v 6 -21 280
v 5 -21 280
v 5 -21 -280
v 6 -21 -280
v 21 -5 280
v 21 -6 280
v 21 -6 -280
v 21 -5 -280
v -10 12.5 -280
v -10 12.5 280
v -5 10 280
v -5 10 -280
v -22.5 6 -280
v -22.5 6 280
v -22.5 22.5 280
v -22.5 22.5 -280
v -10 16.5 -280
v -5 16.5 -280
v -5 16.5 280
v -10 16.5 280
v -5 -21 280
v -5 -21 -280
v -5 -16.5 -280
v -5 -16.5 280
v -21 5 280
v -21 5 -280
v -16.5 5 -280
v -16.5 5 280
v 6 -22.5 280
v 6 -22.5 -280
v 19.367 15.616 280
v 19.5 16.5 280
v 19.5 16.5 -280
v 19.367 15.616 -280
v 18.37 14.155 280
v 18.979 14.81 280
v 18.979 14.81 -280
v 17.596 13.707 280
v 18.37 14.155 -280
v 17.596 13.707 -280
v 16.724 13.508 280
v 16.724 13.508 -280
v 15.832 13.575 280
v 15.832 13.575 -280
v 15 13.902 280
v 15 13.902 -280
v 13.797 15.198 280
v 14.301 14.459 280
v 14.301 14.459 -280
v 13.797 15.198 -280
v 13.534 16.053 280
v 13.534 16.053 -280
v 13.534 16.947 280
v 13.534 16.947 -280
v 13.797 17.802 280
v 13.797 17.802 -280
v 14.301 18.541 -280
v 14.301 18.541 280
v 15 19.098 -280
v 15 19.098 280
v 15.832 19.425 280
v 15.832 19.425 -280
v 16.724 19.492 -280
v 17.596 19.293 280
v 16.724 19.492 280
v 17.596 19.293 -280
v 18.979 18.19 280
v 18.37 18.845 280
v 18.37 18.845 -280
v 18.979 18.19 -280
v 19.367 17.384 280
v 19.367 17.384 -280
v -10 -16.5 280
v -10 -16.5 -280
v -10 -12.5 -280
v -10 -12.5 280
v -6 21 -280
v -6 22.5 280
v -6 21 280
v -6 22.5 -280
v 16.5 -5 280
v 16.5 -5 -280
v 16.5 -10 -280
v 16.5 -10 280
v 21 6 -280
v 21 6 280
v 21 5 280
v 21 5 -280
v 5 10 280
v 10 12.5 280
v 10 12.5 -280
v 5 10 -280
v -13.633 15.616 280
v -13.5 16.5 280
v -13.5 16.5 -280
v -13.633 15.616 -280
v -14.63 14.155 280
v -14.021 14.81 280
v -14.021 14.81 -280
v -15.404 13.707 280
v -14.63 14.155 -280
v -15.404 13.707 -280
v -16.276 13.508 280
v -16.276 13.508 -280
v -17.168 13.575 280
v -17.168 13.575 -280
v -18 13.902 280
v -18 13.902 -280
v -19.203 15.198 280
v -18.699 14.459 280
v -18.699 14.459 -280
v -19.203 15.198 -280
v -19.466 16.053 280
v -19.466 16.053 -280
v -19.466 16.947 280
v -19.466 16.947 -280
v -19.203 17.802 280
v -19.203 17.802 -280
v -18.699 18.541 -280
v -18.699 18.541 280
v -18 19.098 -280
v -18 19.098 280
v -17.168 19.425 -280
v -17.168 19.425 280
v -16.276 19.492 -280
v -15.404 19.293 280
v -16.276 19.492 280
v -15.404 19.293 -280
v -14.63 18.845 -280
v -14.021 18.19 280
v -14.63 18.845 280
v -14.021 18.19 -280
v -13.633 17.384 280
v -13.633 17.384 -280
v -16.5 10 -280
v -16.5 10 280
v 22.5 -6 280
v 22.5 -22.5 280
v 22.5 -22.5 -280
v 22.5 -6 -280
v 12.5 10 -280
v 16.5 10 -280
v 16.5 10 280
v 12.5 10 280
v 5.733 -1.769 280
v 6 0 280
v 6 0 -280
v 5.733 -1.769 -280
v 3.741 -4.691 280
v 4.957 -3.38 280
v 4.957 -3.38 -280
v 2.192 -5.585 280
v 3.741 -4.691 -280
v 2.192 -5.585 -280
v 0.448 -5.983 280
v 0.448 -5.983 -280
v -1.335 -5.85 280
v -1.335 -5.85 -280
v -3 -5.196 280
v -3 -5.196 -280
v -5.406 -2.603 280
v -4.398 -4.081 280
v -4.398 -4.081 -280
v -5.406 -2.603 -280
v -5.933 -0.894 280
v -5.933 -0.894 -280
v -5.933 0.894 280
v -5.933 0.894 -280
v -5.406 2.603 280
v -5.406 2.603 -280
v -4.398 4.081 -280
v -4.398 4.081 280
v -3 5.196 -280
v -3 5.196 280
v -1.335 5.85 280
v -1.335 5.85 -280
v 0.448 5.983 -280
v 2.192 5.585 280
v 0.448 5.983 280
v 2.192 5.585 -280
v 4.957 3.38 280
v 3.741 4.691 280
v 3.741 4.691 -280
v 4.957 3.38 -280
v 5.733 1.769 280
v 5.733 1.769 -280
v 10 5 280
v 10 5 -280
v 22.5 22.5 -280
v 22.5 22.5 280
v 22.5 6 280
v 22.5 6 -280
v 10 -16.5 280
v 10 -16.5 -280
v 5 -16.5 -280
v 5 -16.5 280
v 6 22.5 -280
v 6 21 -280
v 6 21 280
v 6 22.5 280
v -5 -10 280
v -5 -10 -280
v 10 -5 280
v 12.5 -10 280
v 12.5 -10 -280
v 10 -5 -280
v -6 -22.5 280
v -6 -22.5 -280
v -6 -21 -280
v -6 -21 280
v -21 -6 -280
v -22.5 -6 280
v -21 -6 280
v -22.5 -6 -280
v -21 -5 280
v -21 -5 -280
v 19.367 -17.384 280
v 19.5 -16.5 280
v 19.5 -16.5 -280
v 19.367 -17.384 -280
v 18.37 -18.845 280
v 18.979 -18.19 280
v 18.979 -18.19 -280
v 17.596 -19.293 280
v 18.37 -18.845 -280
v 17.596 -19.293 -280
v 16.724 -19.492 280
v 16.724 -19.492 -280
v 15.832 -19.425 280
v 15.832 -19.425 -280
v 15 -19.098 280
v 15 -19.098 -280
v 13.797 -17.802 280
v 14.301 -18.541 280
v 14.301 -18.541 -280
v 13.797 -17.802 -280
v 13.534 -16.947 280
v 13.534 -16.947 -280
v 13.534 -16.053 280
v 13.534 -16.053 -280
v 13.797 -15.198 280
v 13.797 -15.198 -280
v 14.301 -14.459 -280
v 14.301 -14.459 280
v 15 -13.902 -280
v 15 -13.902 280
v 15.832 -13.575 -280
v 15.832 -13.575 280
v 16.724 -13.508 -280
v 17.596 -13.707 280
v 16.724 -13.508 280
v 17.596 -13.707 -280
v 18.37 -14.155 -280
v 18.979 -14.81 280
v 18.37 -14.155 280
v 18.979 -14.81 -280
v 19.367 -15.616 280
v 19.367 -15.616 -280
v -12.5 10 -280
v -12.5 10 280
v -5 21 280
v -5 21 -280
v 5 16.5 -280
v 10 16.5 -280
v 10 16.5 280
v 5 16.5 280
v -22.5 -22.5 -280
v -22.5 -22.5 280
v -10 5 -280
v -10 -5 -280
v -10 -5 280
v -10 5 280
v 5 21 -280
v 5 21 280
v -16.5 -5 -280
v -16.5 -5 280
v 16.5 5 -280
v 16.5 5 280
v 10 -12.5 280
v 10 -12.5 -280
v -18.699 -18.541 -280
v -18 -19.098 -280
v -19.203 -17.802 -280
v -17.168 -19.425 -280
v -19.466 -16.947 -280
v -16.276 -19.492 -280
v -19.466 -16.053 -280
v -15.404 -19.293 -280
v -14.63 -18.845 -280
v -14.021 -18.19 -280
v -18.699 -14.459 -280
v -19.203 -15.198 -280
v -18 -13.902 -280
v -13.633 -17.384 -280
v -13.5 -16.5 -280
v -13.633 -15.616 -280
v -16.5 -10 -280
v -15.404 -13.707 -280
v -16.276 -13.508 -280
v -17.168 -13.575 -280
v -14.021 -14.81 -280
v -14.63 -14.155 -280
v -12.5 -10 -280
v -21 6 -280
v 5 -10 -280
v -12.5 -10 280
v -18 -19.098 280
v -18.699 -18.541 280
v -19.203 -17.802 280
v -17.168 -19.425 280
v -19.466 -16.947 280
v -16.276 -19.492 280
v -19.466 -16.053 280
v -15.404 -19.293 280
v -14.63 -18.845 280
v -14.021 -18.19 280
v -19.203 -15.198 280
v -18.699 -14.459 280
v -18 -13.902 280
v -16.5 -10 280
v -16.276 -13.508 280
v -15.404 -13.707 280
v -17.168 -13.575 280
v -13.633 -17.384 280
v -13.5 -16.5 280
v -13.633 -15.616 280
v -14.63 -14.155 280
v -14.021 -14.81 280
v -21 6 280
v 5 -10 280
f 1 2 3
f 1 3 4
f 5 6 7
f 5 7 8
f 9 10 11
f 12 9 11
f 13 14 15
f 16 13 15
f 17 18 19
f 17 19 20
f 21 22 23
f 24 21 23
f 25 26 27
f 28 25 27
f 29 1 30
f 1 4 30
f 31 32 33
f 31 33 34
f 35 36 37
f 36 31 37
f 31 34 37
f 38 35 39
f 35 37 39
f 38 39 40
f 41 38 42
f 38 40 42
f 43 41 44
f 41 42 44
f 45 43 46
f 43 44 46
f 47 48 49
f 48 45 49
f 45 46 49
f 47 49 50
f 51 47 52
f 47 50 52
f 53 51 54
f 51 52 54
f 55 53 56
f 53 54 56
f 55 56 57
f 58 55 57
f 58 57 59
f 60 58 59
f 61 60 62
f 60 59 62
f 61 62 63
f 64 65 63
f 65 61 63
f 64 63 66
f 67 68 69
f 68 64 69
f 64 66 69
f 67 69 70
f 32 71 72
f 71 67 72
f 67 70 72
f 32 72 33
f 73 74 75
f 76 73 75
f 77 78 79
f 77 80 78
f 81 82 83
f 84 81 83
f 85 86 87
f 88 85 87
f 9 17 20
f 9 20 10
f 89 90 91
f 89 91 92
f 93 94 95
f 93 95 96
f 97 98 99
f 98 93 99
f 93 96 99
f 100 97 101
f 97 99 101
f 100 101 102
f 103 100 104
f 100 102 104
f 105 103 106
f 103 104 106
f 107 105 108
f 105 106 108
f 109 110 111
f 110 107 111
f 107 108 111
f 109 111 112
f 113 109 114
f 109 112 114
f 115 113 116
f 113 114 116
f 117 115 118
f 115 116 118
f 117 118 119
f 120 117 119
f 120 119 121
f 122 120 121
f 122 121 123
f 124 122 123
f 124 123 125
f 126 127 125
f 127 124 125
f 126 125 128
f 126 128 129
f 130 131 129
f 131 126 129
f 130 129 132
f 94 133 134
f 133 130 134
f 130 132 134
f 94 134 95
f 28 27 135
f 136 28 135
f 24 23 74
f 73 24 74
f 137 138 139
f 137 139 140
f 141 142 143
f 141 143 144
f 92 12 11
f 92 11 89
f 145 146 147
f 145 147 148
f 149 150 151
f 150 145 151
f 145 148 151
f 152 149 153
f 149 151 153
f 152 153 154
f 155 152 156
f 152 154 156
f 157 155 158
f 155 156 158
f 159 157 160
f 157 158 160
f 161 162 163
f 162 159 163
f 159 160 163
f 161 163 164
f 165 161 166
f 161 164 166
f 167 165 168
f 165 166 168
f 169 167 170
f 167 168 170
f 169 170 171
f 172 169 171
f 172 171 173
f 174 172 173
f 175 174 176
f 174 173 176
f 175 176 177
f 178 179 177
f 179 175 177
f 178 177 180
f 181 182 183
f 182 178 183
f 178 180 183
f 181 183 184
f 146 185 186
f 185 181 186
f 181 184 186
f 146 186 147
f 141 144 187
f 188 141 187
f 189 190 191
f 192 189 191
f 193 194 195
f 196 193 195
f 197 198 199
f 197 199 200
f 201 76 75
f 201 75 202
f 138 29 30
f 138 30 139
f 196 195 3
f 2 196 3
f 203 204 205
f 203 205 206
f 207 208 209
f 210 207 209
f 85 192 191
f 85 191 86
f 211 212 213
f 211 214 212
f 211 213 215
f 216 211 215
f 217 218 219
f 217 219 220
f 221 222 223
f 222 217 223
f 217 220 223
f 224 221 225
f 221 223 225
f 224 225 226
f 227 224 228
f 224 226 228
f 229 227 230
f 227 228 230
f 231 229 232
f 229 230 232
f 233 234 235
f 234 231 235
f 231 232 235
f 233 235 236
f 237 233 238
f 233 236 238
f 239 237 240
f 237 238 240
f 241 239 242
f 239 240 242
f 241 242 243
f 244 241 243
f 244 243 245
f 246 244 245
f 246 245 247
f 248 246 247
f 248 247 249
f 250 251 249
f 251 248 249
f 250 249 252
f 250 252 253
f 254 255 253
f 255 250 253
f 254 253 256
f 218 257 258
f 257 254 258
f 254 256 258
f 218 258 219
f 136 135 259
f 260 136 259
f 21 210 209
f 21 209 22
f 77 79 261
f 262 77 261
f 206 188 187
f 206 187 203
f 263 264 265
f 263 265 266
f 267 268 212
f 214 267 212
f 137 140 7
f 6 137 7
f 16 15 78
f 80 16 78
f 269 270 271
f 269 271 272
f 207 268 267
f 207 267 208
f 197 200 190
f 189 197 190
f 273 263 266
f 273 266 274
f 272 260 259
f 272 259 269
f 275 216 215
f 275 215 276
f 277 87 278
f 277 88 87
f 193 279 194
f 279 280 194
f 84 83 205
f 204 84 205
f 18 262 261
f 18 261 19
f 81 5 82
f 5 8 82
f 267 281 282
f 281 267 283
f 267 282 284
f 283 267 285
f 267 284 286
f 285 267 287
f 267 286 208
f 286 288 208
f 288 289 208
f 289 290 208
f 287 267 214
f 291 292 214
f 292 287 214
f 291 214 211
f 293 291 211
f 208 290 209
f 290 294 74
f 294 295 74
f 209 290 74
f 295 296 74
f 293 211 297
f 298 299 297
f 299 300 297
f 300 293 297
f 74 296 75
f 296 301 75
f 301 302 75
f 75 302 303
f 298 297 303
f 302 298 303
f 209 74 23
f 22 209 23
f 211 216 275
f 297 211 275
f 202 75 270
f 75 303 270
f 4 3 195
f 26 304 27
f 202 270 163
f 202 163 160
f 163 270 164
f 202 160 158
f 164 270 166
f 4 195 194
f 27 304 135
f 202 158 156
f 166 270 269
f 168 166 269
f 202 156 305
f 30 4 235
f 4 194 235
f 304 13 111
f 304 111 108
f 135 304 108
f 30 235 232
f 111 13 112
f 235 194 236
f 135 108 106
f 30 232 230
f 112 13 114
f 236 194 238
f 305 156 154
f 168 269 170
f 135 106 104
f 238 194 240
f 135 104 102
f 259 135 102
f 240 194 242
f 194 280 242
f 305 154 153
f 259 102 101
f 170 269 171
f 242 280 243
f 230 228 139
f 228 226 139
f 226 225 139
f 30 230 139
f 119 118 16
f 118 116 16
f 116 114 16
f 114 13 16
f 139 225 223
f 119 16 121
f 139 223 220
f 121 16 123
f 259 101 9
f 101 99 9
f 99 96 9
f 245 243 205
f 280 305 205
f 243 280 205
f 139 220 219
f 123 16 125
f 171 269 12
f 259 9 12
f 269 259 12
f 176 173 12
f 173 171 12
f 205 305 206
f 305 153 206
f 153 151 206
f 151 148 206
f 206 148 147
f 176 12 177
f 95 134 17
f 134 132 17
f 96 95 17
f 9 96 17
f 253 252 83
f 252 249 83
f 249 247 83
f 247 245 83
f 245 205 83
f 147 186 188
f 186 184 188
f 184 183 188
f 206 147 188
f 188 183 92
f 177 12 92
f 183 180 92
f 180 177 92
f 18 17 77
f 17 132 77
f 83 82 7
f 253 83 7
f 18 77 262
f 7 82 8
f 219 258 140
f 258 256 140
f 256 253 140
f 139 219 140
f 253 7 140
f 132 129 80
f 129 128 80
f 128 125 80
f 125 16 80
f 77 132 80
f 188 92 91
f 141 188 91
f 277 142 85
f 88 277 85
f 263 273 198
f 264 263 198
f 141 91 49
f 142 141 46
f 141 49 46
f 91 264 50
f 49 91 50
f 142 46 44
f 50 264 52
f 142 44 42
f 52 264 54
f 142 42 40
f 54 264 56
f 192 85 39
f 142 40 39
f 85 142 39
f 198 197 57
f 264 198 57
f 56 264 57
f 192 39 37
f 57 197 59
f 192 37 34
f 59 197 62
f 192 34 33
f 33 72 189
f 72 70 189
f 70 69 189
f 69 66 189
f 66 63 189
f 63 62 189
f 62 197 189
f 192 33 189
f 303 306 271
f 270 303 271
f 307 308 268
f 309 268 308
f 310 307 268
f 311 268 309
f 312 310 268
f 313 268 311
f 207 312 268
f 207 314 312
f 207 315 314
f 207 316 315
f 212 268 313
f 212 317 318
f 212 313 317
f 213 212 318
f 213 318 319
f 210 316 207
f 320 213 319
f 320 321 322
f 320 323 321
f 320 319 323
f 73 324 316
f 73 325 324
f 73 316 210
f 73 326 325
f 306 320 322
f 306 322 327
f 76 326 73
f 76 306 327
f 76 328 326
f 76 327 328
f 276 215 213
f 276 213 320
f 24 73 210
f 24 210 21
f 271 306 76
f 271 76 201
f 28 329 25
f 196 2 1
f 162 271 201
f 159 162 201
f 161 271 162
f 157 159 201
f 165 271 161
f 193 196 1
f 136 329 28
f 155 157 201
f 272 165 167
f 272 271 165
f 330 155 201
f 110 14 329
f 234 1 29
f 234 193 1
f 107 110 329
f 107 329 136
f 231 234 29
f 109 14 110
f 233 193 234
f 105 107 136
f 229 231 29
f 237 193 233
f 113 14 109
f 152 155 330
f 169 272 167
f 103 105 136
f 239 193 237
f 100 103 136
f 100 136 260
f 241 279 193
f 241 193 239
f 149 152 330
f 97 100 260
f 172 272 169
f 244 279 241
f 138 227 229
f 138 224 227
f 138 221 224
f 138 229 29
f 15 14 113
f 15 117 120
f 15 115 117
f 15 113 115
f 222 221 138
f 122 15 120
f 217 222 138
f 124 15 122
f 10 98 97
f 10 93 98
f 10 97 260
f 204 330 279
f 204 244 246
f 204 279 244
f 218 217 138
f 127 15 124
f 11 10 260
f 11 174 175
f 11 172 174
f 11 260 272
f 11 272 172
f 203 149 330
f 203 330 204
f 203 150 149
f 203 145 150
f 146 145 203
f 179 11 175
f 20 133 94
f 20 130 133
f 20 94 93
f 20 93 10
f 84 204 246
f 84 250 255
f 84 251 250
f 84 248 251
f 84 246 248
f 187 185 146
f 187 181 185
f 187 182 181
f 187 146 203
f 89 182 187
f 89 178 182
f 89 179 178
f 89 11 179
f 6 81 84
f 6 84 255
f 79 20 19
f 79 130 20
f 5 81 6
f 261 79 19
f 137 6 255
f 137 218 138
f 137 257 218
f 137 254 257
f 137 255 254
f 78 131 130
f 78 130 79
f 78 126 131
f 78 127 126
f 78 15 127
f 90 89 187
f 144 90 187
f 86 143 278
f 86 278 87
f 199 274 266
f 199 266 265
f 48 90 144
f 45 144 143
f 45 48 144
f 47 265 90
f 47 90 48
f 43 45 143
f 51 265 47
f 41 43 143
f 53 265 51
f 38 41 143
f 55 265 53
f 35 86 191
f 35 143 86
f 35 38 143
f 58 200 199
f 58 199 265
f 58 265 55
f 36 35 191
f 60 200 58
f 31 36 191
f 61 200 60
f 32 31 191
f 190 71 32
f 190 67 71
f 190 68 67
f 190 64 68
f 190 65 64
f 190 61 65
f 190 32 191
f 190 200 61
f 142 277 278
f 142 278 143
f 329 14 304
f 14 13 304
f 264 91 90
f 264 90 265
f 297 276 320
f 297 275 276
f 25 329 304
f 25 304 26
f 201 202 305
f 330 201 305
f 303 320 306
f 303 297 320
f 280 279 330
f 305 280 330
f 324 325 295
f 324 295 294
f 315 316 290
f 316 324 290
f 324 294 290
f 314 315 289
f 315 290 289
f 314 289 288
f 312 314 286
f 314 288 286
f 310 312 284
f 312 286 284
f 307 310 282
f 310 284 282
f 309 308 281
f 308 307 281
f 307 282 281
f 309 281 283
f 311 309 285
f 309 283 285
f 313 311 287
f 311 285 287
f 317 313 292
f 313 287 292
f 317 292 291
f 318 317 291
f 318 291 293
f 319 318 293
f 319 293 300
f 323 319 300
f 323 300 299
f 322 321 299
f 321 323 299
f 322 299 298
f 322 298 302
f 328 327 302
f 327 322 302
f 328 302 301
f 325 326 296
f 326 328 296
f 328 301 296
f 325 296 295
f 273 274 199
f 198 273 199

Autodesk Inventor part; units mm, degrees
ref_plane "YZ Plane" through (0, 0, 0) normal (1, 0, 0) x (0, 1, 0)
ref_plane "XZ Plane" through (0, 0, 0) normal (0, 1, 0) x (-1, 0, 0)
ref_plane "XY Plane" through (0, 0, 0) normal (0, 0, 1) x (1, 0, 0)
sketch "Sketch1" plane through (0, 0, 0) normal (0, 0, 1) x (1, 0, 0)
  line L0 (-22.5, 22.5) -> (-6, 22.5)
  line L1 (-6, 22.5) -> (-6, 21)
  line L2 (-6, 21) -> (-5, 21)
  line L3 (-5, 21) -> (-5, 16.5)
  line L4 (-5, 16.5) -> (-10, 16.5)
  line L5 (-10, 16.5) -> (-10, 12.5)
  line L6 (-10, 12.5) -> (-5, 10)
  line L7 (-5, 10) -> (5, 10)
  line L8 (10, 12.5) -> (10, 16.5)
  line L9 (10, 16.5) -> (5, 16.5)
  line L10 (5, 16.5) -> (5, 21)
  line L11 (5, 21) -> (6, 21)
  line L12 (6, 21) -> (6, 22.5)
  line L13 (6, 22.5) -> (22.5, 22.5)
  line L14 (22.5, 22.5) -> (22.5, 6)
  line L15 (22.5, 6) -> (21, 6)
  line L16 (21, 6) -> (21, 5)
  line L17 (21, 5) -> (16.5, 5)
  line L18 (10, 12.5) -> (5, 10)
  line L19 (-22.5, 0) -> (-22.5, 104.1484) construction
  line L20 (-22.5, 0) -> (77.4828, 0) construction
  line L21 (16.5, 5) -> (16.5, 10)
  line L22 (16.5, 10) -> (12.5, 10)
  line L23 (12.5, 10) -> (10, 5)
  line L24 (10, 5) -> (10, 0)
  circle A0 centre (0, 0) radius 6
  circle A1 centre (16.5, 16.5) radius 3
  line L25 (-22.5, 0) -> (45.512, 0) construction
  line L26 (21, -6) -> (21, -5)
  line L27 (22.5, -6) -> (21, -6)
  line L28 (10, -12.5) -> (10, -16.5)
  line L29 (12.5, -10) -> (10, -5)
  line L30 (16.5, -5) -> (16.5, -10)
  line L31 (16.5, -10) -> (12.5, -10)
  line L32 (10, -12.5) -> (5, -10)
  line L33 (22.5, -22.5) -> (22.5, -6)
  circle A2 centre (16.5, -16.5) radius 3
  line L34 (6, -22.5) -> (22.5, -22.5)
  line L35 (5, -16.5) -> (5, -21)
  line L36 (5, -21) -> (6, -21)
  line L37 (6, -21) -> (6, -22.5)
  line L38 (10, -16.5) -> (5, -16.5)
  line L39 (21, -5) -> (16.5, -5)
  line L40 (10, -5) -> (10, 0)
  line L41 (-5, -10) -> (5, -10)
  line L42 (-22.5, -22.5) -> (-6, -22.5)
  line L43 (-6, -22.5) -> (-6, -21)
  line L44 (-6, -21) -> (-5, -21)
  line L45 (-5, -21) -> (-5, -16.5)
  line L46 (-5, -16.5) -> (-10, -16.5)
  line L47 (-10, -16.5) -> (-10, -12.5)
  line L48 (-10, -12.5) -> (-5, -10)
  line L49 (-22.5, -22.5) -> (-22.5, 22.5)
  line L50 (0, -24.7031) -> (0, 16.5) construction
  line L51 (-12.5, 10) -> (-10, 5)
  line L52 (-16.5, 10) -> (-12.5, 10)
  line L53 (-16.5, 5) -> (-16.5, 10)
  line L54 (-21, 5) -> (-16.5, 5)
  line L55 (-21, 6) -> (-21, 5)
  line L56 (-22.5, 6) -> (-21, 6)
  line L57 (-10, 5) -> (-10, 0)
  line L58 (-10, -5) -> (-10, 0)
  line L59 (-12.5, -10) -> (-10, -5)
  line L60 (-16.5, -10) -> (-12.5, -10)
  line L61 (-16.5, -5) -> (-16.5, -10)
  line L62 (-21, -5) -> (-16.5, -5)
  line L63 (-21, -6) -> (-21, -5)
  line L64 (-22.5, -6) -> (-21, -6)
  circle A3 centre (-16.5, 16.5) radius 3
  circle A4 centre (-16.5, -16.5) radius 3
  point P0 (0, 10)
  point P1 (0, -10)
  point P2 (-69.7014, -56.3955)
  point P3 (-69.7014, -68.3955)
  point P4 (-36.78, -20.9511)
  point P5 (-36.78, -32.9511)
  dimension "d0" = 22.5
  dimension "d1" = 20
  dimension "d2" = 1.5
  dimension "d3" = 1.5
  dimension "d4" = 10
  dimension "d5" = 12
  dimension "d6" = 12.5
  dimension "d7" = 22.5
  dimension "d8" = 5
  dimension "d9" = 6
  dimension "d10" = 10
  dimension "d11" = 6
  dimension "d12" = 4
  dimension "d13" = 5
  dimension "d14" = 6
  dimension "d15" = 45
  dimension "d16" = 10
  dimension "d17" = 4
  dimension "d18" = 12.5
  dimension "d19" = 6
  dimension "d20" = 12
  dimension "d21" = 22.5
  dimension "d22" = 6
  dimension "d23" = 39
  dimension "d24" = 16.5
  dimension "d25" = 12.5
extrude "Extrusion1" add sketch "Sketch1" along normal mid plane 560 contours L0 L1 L2 L3 L4 L5 L6 L7 L18 L8 L9 L10 L11 L12 L13 L14 L15 L16 L17 L21 L22 L23 L24 L40 L29 L31 L30 L39 L26 L27 L33 L34 L37 L36 L35 L38 L28 L32 L41 L48 L47 L46 L45 L44 L43 L42 L49 L64 L63 L62 L61 L60 L59 L58 L57 L51 L52 L53 L54 L55 L56
equation "\"d3\" = d2"
equation "\"d8\" = 0.5 * d4"
equation "\"d9\" = 0.5 * d5"
equation "\"d10\" = 0.5 * d1"
equation "\"d13\" = d8"
equation "\"d14\" = d9"
equation "\"d16\" = d10"
equation "\"d17\" = d12"
equation "\"d19\" = d11"
properties part number "Union soporte P45X45 Trigger" material "Aluminum 6061"
